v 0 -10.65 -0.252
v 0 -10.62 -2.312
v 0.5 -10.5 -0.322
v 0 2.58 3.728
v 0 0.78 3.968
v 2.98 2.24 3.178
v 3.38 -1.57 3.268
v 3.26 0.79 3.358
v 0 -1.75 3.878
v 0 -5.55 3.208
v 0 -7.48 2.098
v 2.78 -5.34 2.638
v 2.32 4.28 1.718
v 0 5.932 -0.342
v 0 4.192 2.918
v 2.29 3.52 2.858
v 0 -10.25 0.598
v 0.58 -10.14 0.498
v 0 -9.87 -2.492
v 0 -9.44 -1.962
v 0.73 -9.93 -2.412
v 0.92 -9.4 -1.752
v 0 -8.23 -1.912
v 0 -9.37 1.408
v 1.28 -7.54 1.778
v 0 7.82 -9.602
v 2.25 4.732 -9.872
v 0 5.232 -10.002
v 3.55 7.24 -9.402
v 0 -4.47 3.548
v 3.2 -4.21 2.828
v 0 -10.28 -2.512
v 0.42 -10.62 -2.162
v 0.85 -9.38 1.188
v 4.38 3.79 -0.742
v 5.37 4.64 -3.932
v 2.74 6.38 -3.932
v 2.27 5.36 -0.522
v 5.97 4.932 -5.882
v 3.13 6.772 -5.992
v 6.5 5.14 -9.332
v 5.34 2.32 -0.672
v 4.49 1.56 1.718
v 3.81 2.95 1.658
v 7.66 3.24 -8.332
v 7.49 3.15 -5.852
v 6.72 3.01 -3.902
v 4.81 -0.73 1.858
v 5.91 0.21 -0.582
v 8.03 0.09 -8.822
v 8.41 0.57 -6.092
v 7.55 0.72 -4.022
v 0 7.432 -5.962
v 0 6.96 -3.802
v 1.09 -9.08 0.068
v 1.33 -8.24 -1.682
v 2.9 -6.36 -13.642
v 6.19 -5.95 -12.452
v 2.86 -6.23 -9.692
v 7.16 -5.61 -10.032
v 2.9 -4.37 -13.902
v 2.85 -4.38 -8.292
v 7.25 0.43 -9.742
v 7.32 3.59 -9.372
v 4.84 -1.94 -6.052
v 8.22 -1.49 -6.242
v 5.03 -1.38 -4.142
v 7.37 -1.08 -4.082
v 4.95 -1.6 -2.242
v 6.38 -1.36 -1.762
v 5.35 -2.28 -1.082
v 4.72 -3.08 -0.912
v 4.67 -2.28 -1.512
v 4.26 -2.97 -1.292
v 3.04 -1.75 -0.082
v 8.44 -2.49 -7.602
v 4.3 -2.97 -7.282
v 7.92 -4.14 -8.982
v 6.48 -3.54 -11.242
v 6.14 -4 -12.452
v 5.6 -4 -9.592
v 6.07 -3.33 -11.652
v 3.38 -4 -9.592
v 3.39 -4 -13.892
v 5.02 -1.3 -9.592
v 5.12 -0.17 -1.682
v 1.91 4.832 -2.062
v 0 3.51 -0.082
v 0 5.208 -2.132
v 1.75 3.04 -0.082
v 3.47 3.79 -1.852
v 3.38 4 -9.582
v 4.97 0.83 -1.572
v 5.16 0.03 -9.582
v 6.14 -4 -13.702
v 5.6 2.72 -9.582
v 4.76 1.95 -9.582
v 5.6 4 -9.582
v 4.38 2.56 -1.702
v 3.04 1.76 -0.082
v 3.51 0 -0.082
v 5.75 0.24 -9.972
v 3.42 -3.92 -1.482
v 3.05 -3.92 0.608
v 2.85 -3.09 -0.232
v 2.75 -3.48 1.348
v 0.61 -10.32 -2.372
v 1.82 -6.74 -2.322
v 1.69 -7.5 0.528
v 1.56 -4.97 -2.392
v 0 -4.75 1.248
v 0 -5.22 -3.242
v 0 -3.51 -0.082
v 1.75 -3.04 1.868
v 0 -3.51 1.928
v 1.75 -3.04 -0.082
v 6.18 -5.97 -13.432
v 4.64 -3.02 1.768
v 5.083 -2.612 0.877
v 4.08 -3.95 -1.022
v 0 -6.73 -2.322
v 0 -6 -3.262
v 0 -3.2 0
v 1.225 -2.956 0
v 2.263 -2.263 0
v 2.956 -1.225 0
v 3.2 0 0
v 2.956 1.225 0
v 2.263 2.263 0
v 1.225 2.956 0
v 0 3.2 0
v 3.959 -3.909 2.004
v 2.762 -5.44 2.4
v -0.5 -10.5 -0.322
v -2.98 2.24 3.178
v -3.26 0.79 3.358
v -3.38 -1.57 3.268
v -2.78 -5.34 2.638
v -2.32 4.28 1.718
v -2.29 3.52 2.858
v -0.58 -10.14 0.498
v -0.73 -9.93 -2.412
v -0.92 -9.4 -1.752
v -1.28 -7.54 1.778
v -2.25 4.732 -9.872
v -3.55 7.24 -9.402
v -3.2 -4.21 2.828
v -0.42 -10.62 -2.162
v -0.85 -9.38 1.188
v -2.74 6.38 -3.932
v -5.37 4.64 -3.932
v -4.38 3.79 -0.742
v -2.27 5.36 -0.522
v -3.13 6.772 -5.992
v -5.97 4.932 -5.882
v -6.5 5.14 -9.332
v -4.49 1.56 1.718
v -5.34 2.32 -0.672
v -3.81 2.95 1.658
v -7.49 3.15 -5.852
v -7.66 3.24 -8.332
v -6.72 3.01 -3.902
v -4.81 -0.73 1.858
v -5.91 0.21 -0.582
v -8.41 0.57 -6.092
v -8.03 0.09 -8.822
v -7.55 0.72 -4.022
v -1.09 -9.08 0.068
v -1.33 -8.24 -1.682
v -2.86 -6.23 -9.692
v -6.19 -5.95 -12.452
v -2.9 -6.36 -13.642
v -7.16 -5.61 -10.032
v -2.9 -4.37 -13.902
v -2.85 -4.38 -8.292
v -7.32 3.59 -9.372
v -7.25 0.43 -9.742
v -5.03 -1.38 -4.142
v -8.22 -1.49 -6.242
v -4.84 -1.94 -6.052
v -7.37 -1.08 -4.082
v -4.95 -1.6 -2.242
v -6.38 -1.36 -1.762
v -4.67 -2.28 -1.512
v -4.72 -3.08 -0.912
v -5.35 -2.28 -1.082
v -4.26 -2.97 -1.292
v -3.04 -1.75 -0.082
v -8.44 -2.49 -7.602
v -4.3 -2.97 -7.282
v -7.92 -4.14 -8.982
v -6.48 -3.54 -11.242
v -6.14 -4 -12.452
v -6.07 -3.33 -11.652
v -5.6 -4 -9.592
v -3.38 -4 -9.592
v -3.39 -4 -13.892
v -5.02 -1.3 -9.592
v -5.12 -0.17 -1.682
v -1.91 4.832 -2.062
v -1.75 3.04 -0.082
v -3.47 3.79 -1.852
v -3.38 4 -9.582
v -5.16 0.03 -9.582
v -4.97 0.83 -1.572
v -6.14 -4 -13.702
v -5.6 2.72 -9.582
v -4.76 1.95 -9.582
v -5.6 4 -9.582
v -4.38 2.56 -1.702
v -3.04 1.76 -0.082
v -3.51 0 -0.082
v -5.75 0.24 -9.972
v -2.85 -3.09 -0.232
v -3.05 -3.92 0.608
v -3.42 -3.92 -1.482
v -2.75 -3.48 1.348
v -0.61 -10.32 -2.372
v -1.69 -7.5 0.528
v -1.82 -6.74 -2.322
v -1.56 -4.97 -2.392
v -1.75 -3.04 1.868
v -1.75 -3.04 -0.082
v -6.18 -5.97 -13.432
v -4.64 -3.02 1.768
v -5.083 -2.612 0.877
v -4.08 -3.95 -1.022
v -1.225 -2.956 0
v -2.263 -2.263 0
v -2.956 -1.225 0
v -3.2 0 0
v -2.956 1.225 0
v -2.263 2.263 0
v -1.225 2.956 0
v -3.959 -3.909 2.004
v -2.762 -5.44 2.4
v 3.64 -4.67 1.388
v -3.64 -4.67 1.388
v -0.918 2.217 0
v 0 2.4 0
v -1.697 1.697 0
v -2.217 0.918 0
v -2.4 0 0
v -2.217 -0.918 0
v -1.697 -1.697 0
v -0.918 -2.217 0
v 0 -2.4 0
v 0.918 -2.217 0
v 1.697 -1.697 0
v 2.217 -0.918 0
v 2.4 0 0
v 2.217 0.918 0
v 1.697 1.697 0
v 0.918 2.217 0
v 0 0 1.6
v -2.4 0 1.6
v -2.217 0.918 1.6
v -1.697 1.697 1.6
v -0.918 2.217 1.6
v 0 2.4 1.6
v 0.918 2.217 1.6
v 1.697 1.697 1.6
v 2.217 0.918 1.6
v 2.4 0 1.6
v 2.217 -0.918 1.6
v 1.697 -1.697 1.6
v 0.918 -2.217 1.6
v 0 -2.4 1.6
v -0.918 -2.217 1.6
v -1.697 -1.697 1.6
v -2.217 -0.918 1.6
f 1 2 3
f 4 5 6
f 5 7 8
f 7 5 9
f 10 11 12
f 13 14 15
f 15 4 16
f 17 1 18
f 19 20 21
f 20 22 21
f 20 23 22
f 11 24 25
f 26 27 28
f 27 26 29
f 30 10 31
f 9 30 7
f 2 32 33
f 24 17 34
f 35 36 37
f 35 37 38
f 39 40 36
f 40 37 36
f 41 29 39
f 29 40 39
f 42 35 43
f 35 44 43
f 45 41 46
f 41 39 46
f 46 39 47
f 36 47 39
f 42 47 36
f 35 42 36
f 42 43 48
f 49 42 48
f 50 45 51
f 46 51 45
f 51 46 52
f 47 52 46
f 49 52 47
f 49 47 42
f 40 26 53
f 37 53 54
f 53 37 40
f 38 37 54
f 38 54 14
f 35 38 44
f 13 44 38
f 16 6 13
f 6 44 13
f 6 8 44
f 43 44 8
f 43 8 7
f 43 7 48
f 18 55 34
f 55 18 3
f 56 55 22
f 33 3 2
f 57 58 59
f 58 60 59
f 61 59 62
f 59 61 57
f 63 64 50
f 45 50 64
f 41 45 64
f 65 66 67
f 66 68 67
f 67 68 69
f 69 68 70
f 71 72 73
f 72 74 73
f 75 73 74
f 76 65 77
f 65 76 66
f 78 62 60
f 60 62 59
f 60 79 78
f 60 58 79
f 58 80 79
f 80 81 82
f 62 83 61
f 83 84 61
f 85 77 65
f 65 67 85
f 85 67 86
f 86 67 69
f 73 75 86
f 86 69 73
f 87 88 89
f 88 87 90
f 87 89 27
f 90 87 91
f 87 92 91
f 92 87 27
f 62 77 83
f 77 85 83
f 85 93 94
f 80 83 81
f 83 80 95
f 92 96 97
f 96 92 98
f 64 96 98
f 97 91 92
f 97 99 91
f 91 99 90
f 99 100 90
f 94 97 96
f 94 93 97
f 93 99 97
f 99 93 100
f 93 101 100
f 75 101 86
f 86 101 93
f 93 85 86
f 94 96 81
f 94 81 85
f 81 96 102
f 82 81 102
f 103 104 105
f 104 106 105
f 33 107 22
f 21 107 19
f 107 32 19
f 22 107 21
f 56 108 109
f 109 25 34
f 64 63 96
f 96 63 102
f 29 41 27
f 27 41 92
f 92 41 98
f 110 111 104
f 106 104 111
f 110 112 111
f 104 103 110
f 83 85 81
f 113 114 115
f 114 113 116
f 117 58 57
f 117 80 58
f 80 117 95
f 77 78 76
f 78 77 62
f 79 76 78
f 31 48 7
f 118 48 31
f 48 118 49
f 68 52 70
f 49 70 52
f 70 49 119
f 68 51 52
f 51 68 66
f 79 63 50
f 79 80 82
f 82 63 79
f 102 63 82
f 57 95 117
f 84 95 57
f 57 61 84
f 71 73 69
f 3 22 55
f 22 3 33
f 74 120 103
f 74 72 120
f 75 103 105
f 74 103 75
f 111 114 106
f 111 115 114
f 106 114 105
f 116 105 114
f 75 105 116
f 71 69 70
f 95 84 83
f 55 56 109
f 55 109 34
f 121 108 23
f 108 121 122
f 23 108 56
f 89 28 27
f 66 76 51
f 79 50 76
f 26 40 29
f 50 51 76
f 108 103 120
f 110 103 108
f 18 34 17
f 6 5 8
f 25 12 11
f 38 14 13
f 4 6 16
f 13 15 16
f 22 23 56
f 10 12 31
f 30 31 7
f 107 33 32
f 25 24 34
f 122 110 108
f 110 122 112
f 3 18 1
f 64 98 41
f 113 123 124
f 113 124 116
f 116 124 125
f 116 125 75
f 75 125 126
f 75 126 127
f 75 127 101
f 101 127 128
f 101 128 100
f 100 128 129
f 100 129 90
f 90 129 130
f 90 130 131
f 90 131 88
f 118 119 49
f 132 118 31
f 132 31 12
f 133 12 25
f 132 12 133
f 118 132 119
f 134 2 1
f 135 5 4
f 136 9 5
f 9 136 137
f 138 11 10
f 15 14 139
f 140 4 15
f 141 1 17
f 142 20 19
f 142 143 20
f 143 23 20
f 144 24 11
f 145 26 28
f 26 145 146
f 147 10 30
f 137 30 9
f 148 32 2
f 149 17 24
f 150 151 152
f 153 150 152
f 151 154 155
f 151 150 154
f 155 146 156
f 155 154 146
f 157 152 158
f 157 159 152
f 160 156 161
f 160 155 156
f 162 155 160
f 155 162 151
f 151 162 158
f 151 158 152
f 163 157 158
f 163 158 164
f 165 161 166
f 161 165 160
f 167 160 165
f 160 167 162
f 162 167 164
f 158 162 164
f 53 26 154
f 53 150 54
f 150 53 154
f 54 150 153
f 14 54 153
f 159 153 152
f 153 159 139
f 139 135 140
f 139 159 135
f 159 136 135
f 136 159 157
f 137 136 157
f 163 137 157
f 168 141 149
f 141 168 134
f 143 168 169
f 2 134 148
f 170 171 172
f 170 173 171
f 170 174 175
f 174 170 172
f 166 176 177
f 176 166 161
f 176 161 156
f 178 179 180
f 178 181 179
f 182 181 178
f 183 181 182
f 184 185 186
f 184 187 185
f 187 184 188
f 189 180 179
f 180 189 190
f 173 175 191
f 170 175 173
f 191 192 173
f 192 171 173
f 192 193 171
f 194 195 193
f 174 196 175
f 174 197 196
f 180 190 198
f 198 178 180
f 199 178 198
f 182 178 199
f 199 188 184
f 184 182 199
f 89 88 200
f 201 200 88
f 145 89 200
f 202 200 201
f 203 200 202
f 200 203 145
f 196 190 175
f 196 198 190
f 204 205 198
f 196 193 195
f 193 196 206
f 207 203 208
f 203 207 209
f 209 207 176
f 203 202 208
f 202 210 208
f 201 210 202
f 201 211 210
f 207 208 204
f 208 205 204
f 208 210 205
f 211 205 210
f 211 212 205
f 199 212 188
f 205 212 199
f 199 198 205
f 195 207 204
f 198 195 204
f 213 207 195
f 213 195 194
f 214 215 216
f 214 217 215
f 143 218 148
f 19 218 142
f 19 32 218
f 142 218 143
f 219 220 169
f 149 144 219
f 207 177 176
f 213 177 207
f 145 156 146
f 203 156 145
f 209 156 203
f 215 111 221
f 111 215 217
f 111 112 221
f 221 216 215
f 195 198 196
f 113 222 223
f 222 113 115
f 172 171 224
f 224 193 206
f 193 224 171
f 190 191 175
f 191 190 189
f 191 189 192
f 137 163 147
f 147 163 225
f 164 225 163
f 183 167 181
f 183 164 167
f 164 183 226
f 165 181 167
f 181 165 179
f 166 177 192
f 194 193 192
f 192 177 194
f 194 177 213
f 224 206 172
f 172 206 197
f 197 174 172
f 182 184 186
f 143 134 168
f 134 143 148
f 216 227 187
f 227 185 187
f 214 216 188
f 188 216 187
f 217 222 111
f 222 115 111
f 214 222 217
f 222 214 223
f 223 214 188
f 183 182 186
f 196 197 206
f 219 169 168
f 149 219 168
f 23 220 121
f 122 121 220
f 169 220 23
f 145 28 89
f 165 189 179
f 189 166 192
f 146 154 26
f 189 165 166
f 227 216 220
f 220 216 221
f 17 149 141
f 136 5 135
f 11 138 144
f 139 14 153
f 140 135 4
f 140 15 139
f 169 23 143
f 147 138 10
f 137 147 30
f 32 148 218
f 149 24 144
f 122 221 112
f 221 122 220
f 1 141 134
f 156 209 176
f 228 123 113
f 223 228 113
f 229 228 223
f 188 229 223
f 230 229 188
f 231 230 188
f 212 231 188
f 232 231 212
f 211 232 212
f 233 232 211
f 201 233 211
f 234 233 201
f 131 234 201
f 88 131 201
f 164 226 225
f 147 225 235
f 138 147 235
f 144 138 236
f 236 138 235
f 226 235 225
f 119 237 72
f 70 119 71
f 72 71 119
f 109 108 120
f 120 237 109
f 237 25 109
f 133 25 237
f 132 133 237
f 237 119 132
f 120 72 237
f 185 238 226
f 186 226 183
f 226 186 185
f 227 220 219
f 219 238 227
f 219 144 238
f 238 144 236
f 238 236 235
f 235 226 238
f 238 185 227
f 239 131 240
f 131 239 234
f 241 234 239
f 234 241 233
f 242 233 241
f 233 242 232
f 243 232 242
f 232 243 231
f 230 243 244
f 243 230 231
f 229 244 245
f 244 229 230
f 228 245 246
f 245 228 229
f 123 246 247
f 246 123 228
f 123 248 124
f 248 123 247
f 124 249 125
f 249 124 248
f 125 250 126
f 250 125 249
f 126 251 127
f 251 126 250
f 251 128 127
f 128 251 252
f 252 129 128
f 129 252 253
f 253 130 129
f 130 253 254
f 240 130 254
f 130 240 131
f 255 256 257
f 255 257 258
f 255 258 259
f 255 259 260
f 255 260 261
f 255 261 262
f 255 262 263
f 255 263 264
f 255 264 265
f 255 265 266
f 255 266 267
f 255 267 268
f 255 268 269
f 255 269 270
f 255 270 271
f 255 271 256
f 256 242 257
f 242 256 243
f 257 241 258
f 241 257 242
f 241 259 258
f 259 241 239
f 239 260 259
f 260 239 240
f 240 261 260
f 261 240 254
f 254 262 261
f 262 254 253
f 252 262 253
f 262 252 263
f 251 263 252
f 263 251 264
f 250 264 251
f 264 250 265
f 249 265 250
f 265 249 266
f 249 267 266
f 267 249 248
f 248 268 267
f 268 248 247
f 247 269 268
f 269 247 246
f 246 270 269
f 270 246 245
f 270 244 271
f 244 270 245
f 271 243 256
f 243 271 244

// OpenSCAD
use <../lib.scad>
use <s/93249s01.scad>
use <s/93249s02.scad>
use <../p/stud4o.scad>
$fa=1; $fs=0.2;
function ldraw_lib__93249(realsolid=false) = [
// 0 Minifig Headdress Horus
// 0 Name: 93249.dat
// 0 Author: Stan Isachenko [angmarec]
// 0 !LDRAW_ORG Part UPDATE 2012-03
// 0 !LICENSE Licensed under CC BY 2.0 and CC BY 4.0 : see CAreadme.txt
// 
// 0 BFC CERTIFY CCW
  [0,"BFC","CERTIFY"],
  [0,"BFC","CCW"],
// 
// 0 !CATEGORY Minifig Headwear
// 0 !KEYWORDS Pharaoh's Quest
// 
// 0 !HISTORY 2011-10-16 {LEGO Digital Designer} Original part shape
// 0 !HISTORY 2011-10-16 [angmarec] File preparation for LDraw Parts Tracker
// 0 !HISTORY 2011-11-13 [MagFors] Added more edge and conditional lines.
// 0 !HISTORY 2011-12-29 [PTadmin] Official Update 2011-02
// 0 !HISTORY 2012-12-24 [cwdee] Add category
// 0 !HISTORY 2012-12-28 [PTadmin] Official Update 2012-03
// 
// 
// 1 16 0 0 0 1 0 0 0 1 0 0 0 1 s\93249s01.dat
  [1,16,0,0,0,1,0,0,0,1,0,0,0,1, ldraw_lib__s__93249s01(realsolid)],
// 1 16 0 0 0 -1 0 0 0 1 0 0 0 1 s\93249s01.dat
  [1,16,0,0,0,-1,0,0,0,1,0,0,0,1, ldraw_lib__s__93249s01(realsolid)],
// 1 16 0 0 0 1 0 0 0 1 0 0 0 1 s\93249s02.dat
  [1,16,0,0,0,1,0,0,0,1,0,0,0,1, ldraw_lib__s__93249s02(realsolid)],
// 1 16 0 0 0 -1 0 0 0 1 0 0 0 1 s\93249s02.dat
  [1,16,0,0,0,-1,0,0,0,1,0,0,0,1, ldraw_lib__s__93249s02(realsolid)],
// 1 16 0 -4 0 1 0 0 0 -1 0 0 0 1 stud4o.dat
  [1,16,0,-4,0,1,0,0,0,-1,0,0,0,1, ldraw_lib__stud4o(realsolid)],
// 0 //
// 2 24 0 8.155 -15 0 8.105 -13.05
  [2,24,0,8.155,-15,0,8.105,-13.05],
// 0 // Added lines/Condlines
// 5 24 0 0.63 -26.625 0 5.78 -26.55 1.25 0.805 -26.25 -1.25 0.805 -26.25
  [5,24,0,0.63,-26.625,0,5.78,-26.55,1.25,0.805,-26.25,-1.25,0.805,-26.25],
// 5 24 0 -9.32 6.45 0 -9.92 1.95 7.45 -7.945 5.6 -7.45 -7.945 5.6
  [5,24,0,-9.32,6.45,0,-9.92,1.95,7.45,-7.945,5.6,-7.45,-7.945,5.6],
// 5 24 0 -9.92 1.95 0 -9.695 -4.375 8.15 -8.395 1.975 -8.15 -8.395 1.975
  [5,24,0,-9.92,1.95,0,-9.695,-4.375,8.15,-8.395,1.975,-8.15,-8.395,1.975],
// 5 24 0 -8.02 -13.875 0 -5.245 -18.7 6.95 -6.595 -13.35 -6.95 -6.595 -13.35
  [5,24,0,-8.02,-13.875,0,-5.245,-18.7,6.95,-6.595,-13.35,-6.95,-6.595,-13.35],
// 5 24 0 0.855 14.83 0 -7.295 10.48 5.8 -4.295 10.7 -5.8 -4.295 10.7
  [5,24,0,0.855,14.83,0,-7.295,10.48,5.8,-4.295,10.7,-5.8,-4.295,10.7],
// 5 24 0 -7.295 10.48 0 -9.32 6.45 5.725 -7.145 8.8 -5.725 -7.145 8.8
  [5,24,0,-7.295,10.48,0,-9.32,6.45,5.725,-7.145,8.8,-5.725,-7.145,8.8],
// 5 24 0 -1.495 -25.625 0 0.63 -26.625 1.45 -1.245 -25.35 -1.45 -1.245 -25.35
  [5,24,0,-1.495,-25.625,0,0.63,-26.625,1.45,-1.245,-25.35,-1.45,-1.245,-25.35],
// 5 24 0 6.23 -24.675 0 4.905 -23.6 1.825 6.03 -24.825 -1.825 6.03 -24.825
  [5,24,0,6.23,-24.675,0,4.905,-23.6,1.825,6.03,-24.825,-1.825,6.03,-24.825],
// 5 24 0 4.905 -23.6 0 4.78 -20.575 2.3 4.38 -23.5 -2.3 4.38 -23.5
  [5,24,0,4.905,-23.6,0,4.78,-20.575,2.3,4.38,-23.5,-2.3,4.38,-23.5],
// 5 24 0 -5.245 -18.7 0 -3.52 -23.425 3.2 -4.445 -18.85 -3.2 -4.445 -18.85
  [5,24,0,-5.245,-18.7,0,-3.52,-23.425,3.2,-4.445,-18.85,-3.2,-4.445,-18.85],
// 5 24 0 25.005 13.08 0 24.005 19.55 8.875 23.505 18.1 -8.875 23.505 18.1
  [5,24,0,25.005,13.08,0,24.005,19.55,8.875,23.505,18.1,-8.875,23.505,18.1],
// 5 24 0 -8.87 -11.175 0 -8.02 -13.875 8 -7.07 -10.525 -8 -7.07 -10.525
  [5,24,0,-8.87,-11.175,0,-8.02,-13.875,8,-7.07,-10.525,-8,-7.07,-10.525],
// 5 24 0 -9.695 -4.375 0 -8.87 -11.175 8.45 -8.17 -3.925 -8.45 -8.17 -3.925
  [5,24,0,-9.695,-4.375,0,-8.87,-11.175,8.45,-8.17,-3.925,-8.45,-8.17,-3.925],
// 5 24 0 5.78 -26.55 0 6.28 -25.7 1.05 5.405 -26.55 -1.05 5.405 -26.55
  [5,24,0,5.78,-26.55,0,6.28,-25.7,1.05,5.405,-26.55,-1.05,5.405,-26.55],
// 5 24 0 -3.52 -23.425 0 -1.495 -25.625 2.125 -2.97 -23.45 -2.125 -2.97 -23.45
  [5,24,0,-3.52,-23.425,0,-1.495,-25.625,2.125,-2.97,-23.45,-2.125,-2.97,-23.45],
// 5 24 0 24.005 19.55 0 14.905 18.58 7.825 14.98 16.93 -7.825 14.98 16.93
  [5,24,0,24.005,19.55,0,14.905,18.58,7.825,14.98,16.93,-7.825,14.98,16.93],
// 5 24 0 14.905 18.58 0 9.505 17.4 6.85 9.83 15.95 -7.825 14.98 16.93
  [5,24,0,14.905,18.58,0,9.505,17.4,6.85,9.83,15.95,-7.825,14.98,16.93],
// 5 24 0 9.505 17.4 0 0.855 14.83 5.675 1.305 13.4 -5.675 1.305 13.4
  [5,24,0,9.505,17.4,0,0.855,14.83,5.675,1.305,13.4,-5.675,1.305,13.4],
// 5 24 0 0.205 8.775 0 5.33 13.02 4.775 5.155 12.08 -4.775 5.155 12.08
  [5,24,0,0.205,8.775,0,5.33,13.02,4.775,5.155,12.08,-4.775,5.155,12.08],
// 5 24 0 6.28 -25.7 0 6.23 -24.675 1.525 5.93 -25.8 -1.525 5.93 -25.8
  [5,24,0,6.28,-25.7,0,6.23,-24.675,1.525,5.93,-25.8,-1.525,5.93,-25.8],
// 5 24 0 8.105 -13.05 0 -3.12 -11.875 3.9 5.98 -12.425 -3.9 5.98 -12.425
  [5,24,0,8.105,-13.05,0,-3.12,-11.875,3.9,5.98,-12.425,-3.9,5.98,-12.425],
// 5 24 0 -4.82 -8.775 0 0.205 -8.775 4.375 -4.67 -7.6 -4.375 -4.67 -7.6
  [5,24,0,-4.82,-8.775,0,0.205,-8.775,4.375,-4.67,-7.6,-4.375,-4.67,-7.6],
// 5 24 8 -7.07 -10.525 11.6 -4.42 -7.55 12.025 -4.645 -1.825 9.89802 -5.0107 -9.773
  [5,24,8,-7.07,-10.525,11.6,-4.42,-7.55,12.025,-4.645,-1.825,9.89802,-5.0107,-9.773],
// 5 24 0 -3.12 -11.875 0 -4.82 -8.775 4.375 -4.67 -7.6 -4.375 -4.67 -7.6
  [5,24,0,-3.12,-11.875,0,-4.82,-8.775,4.375,-4.67,-7.6,-4.375,-4.67,-7.6],
// 5 24 0 4.78 -20.575 0 5.805 -16.825 4.55 5.805 -16.85 -4.55 5.805 -16.85
  [5,24,0,4.78,-20.575,0,5.805,-16.825,4.55,5.805,-16.85,-4.55,5.805,-16.85],
// 5 24 0 5.805 -16.825 0 8.155 -15 4.55 5.805 -16.85 -4.55 5.805 -16.85
  [5,24,0,5.805,-16.825,0,8.155,-15,4.55,5.805,-16.85,-4.55,5.805,-16.85],
// 5 24 0 5.33 13.02 0 25.005 13.08 5.625 24.68 11.83 -5.625 24.68 11.83
  [5,24,0,5.33,13.02,0,25.005,13.08,5.625,24.68,11.83,-5.625,24.68,11.83],
// 5 24 6.95 -6.595 -13.35 8 -7.07 -10.525 0 -8.02 -13.875 9.89802 -5.0107 -9.773
  [5,24,6.95,-6.595,-13.35,8,-7.07,-10.525,0,-8.02,-13.875,9.89802,-5.0107,-9.773],
// 5 24 0 0.205 -8.775 0 0 -8 3.0616 0 -7.3912 -3.0616 0 -7.3912
  [5,24,0,0.205,-8.775,0,0,-8,3.0616,0,-7.3912,-3.0616,0,-7.3912],
// 5 24 0 0 8 0 0.205 8.775 4.375 0.205 7.6 -4.375 0.205 7.6
  [5,24,0,0,8,0,0.205,8.775,4.375,0.205,7.6,-4.375,0.205,7.6],
// 5 24 6.95 -6.595 -13.35 9.89802 -5.0107 -9.773 8 -7.07 -10.525 6.90521 -6 -13.6
  [5,24,6.95,-6.595,-13.35,9.89802,-5.0107,-9.773,8,-7.07,-10.525,6.90521,-6,-13.6],
// 5 24 -11.6 -4.42 -7.55 -8 -7.07 -10.525 -12.025 -4.645 -1.825 -9.89802 -5.0107 -9.773
  [5,24,-11.6,-4.42,-7.55,-8,-7.07,-10.525,-12.025,-4.645,-1.825,-9.89802,-5.0107,-9.773],
// 5 24 -8 -7.07 -10.525 -6.95 -6.595 -13.35 0 -8.02 -13.875 -9.89802 -5.0107 -9.773
  [5,24,-8,-7.07,-10.525,-6.95,-6.595,-13.35,0,-8.02,-13.875,-9.89802,-5.0107,-9.773],
// 5 24 -9.89802 -5.0107 -9.773 -6.95 -6.595 -13.35 -8 -7.07 -10.525 -6.90521 -6 -13.6
  [5,24,-9.89802,-5.0107,-9.773,-6.95,-6.595,-13.35,-8,-7.07,-10.525,-6.90521,-6,-13.6],
];
module ldraw_lib__93249(step=0, col=false, unit=2/5, alt=false, line=0.2, solid=!$preview)
    makepoly(ldraw_lib__93249(solid), step=step, col=col, unit=unit, alt=alt, line=line, solid=solid);
ldraw_lib__93249(line=0.2);
